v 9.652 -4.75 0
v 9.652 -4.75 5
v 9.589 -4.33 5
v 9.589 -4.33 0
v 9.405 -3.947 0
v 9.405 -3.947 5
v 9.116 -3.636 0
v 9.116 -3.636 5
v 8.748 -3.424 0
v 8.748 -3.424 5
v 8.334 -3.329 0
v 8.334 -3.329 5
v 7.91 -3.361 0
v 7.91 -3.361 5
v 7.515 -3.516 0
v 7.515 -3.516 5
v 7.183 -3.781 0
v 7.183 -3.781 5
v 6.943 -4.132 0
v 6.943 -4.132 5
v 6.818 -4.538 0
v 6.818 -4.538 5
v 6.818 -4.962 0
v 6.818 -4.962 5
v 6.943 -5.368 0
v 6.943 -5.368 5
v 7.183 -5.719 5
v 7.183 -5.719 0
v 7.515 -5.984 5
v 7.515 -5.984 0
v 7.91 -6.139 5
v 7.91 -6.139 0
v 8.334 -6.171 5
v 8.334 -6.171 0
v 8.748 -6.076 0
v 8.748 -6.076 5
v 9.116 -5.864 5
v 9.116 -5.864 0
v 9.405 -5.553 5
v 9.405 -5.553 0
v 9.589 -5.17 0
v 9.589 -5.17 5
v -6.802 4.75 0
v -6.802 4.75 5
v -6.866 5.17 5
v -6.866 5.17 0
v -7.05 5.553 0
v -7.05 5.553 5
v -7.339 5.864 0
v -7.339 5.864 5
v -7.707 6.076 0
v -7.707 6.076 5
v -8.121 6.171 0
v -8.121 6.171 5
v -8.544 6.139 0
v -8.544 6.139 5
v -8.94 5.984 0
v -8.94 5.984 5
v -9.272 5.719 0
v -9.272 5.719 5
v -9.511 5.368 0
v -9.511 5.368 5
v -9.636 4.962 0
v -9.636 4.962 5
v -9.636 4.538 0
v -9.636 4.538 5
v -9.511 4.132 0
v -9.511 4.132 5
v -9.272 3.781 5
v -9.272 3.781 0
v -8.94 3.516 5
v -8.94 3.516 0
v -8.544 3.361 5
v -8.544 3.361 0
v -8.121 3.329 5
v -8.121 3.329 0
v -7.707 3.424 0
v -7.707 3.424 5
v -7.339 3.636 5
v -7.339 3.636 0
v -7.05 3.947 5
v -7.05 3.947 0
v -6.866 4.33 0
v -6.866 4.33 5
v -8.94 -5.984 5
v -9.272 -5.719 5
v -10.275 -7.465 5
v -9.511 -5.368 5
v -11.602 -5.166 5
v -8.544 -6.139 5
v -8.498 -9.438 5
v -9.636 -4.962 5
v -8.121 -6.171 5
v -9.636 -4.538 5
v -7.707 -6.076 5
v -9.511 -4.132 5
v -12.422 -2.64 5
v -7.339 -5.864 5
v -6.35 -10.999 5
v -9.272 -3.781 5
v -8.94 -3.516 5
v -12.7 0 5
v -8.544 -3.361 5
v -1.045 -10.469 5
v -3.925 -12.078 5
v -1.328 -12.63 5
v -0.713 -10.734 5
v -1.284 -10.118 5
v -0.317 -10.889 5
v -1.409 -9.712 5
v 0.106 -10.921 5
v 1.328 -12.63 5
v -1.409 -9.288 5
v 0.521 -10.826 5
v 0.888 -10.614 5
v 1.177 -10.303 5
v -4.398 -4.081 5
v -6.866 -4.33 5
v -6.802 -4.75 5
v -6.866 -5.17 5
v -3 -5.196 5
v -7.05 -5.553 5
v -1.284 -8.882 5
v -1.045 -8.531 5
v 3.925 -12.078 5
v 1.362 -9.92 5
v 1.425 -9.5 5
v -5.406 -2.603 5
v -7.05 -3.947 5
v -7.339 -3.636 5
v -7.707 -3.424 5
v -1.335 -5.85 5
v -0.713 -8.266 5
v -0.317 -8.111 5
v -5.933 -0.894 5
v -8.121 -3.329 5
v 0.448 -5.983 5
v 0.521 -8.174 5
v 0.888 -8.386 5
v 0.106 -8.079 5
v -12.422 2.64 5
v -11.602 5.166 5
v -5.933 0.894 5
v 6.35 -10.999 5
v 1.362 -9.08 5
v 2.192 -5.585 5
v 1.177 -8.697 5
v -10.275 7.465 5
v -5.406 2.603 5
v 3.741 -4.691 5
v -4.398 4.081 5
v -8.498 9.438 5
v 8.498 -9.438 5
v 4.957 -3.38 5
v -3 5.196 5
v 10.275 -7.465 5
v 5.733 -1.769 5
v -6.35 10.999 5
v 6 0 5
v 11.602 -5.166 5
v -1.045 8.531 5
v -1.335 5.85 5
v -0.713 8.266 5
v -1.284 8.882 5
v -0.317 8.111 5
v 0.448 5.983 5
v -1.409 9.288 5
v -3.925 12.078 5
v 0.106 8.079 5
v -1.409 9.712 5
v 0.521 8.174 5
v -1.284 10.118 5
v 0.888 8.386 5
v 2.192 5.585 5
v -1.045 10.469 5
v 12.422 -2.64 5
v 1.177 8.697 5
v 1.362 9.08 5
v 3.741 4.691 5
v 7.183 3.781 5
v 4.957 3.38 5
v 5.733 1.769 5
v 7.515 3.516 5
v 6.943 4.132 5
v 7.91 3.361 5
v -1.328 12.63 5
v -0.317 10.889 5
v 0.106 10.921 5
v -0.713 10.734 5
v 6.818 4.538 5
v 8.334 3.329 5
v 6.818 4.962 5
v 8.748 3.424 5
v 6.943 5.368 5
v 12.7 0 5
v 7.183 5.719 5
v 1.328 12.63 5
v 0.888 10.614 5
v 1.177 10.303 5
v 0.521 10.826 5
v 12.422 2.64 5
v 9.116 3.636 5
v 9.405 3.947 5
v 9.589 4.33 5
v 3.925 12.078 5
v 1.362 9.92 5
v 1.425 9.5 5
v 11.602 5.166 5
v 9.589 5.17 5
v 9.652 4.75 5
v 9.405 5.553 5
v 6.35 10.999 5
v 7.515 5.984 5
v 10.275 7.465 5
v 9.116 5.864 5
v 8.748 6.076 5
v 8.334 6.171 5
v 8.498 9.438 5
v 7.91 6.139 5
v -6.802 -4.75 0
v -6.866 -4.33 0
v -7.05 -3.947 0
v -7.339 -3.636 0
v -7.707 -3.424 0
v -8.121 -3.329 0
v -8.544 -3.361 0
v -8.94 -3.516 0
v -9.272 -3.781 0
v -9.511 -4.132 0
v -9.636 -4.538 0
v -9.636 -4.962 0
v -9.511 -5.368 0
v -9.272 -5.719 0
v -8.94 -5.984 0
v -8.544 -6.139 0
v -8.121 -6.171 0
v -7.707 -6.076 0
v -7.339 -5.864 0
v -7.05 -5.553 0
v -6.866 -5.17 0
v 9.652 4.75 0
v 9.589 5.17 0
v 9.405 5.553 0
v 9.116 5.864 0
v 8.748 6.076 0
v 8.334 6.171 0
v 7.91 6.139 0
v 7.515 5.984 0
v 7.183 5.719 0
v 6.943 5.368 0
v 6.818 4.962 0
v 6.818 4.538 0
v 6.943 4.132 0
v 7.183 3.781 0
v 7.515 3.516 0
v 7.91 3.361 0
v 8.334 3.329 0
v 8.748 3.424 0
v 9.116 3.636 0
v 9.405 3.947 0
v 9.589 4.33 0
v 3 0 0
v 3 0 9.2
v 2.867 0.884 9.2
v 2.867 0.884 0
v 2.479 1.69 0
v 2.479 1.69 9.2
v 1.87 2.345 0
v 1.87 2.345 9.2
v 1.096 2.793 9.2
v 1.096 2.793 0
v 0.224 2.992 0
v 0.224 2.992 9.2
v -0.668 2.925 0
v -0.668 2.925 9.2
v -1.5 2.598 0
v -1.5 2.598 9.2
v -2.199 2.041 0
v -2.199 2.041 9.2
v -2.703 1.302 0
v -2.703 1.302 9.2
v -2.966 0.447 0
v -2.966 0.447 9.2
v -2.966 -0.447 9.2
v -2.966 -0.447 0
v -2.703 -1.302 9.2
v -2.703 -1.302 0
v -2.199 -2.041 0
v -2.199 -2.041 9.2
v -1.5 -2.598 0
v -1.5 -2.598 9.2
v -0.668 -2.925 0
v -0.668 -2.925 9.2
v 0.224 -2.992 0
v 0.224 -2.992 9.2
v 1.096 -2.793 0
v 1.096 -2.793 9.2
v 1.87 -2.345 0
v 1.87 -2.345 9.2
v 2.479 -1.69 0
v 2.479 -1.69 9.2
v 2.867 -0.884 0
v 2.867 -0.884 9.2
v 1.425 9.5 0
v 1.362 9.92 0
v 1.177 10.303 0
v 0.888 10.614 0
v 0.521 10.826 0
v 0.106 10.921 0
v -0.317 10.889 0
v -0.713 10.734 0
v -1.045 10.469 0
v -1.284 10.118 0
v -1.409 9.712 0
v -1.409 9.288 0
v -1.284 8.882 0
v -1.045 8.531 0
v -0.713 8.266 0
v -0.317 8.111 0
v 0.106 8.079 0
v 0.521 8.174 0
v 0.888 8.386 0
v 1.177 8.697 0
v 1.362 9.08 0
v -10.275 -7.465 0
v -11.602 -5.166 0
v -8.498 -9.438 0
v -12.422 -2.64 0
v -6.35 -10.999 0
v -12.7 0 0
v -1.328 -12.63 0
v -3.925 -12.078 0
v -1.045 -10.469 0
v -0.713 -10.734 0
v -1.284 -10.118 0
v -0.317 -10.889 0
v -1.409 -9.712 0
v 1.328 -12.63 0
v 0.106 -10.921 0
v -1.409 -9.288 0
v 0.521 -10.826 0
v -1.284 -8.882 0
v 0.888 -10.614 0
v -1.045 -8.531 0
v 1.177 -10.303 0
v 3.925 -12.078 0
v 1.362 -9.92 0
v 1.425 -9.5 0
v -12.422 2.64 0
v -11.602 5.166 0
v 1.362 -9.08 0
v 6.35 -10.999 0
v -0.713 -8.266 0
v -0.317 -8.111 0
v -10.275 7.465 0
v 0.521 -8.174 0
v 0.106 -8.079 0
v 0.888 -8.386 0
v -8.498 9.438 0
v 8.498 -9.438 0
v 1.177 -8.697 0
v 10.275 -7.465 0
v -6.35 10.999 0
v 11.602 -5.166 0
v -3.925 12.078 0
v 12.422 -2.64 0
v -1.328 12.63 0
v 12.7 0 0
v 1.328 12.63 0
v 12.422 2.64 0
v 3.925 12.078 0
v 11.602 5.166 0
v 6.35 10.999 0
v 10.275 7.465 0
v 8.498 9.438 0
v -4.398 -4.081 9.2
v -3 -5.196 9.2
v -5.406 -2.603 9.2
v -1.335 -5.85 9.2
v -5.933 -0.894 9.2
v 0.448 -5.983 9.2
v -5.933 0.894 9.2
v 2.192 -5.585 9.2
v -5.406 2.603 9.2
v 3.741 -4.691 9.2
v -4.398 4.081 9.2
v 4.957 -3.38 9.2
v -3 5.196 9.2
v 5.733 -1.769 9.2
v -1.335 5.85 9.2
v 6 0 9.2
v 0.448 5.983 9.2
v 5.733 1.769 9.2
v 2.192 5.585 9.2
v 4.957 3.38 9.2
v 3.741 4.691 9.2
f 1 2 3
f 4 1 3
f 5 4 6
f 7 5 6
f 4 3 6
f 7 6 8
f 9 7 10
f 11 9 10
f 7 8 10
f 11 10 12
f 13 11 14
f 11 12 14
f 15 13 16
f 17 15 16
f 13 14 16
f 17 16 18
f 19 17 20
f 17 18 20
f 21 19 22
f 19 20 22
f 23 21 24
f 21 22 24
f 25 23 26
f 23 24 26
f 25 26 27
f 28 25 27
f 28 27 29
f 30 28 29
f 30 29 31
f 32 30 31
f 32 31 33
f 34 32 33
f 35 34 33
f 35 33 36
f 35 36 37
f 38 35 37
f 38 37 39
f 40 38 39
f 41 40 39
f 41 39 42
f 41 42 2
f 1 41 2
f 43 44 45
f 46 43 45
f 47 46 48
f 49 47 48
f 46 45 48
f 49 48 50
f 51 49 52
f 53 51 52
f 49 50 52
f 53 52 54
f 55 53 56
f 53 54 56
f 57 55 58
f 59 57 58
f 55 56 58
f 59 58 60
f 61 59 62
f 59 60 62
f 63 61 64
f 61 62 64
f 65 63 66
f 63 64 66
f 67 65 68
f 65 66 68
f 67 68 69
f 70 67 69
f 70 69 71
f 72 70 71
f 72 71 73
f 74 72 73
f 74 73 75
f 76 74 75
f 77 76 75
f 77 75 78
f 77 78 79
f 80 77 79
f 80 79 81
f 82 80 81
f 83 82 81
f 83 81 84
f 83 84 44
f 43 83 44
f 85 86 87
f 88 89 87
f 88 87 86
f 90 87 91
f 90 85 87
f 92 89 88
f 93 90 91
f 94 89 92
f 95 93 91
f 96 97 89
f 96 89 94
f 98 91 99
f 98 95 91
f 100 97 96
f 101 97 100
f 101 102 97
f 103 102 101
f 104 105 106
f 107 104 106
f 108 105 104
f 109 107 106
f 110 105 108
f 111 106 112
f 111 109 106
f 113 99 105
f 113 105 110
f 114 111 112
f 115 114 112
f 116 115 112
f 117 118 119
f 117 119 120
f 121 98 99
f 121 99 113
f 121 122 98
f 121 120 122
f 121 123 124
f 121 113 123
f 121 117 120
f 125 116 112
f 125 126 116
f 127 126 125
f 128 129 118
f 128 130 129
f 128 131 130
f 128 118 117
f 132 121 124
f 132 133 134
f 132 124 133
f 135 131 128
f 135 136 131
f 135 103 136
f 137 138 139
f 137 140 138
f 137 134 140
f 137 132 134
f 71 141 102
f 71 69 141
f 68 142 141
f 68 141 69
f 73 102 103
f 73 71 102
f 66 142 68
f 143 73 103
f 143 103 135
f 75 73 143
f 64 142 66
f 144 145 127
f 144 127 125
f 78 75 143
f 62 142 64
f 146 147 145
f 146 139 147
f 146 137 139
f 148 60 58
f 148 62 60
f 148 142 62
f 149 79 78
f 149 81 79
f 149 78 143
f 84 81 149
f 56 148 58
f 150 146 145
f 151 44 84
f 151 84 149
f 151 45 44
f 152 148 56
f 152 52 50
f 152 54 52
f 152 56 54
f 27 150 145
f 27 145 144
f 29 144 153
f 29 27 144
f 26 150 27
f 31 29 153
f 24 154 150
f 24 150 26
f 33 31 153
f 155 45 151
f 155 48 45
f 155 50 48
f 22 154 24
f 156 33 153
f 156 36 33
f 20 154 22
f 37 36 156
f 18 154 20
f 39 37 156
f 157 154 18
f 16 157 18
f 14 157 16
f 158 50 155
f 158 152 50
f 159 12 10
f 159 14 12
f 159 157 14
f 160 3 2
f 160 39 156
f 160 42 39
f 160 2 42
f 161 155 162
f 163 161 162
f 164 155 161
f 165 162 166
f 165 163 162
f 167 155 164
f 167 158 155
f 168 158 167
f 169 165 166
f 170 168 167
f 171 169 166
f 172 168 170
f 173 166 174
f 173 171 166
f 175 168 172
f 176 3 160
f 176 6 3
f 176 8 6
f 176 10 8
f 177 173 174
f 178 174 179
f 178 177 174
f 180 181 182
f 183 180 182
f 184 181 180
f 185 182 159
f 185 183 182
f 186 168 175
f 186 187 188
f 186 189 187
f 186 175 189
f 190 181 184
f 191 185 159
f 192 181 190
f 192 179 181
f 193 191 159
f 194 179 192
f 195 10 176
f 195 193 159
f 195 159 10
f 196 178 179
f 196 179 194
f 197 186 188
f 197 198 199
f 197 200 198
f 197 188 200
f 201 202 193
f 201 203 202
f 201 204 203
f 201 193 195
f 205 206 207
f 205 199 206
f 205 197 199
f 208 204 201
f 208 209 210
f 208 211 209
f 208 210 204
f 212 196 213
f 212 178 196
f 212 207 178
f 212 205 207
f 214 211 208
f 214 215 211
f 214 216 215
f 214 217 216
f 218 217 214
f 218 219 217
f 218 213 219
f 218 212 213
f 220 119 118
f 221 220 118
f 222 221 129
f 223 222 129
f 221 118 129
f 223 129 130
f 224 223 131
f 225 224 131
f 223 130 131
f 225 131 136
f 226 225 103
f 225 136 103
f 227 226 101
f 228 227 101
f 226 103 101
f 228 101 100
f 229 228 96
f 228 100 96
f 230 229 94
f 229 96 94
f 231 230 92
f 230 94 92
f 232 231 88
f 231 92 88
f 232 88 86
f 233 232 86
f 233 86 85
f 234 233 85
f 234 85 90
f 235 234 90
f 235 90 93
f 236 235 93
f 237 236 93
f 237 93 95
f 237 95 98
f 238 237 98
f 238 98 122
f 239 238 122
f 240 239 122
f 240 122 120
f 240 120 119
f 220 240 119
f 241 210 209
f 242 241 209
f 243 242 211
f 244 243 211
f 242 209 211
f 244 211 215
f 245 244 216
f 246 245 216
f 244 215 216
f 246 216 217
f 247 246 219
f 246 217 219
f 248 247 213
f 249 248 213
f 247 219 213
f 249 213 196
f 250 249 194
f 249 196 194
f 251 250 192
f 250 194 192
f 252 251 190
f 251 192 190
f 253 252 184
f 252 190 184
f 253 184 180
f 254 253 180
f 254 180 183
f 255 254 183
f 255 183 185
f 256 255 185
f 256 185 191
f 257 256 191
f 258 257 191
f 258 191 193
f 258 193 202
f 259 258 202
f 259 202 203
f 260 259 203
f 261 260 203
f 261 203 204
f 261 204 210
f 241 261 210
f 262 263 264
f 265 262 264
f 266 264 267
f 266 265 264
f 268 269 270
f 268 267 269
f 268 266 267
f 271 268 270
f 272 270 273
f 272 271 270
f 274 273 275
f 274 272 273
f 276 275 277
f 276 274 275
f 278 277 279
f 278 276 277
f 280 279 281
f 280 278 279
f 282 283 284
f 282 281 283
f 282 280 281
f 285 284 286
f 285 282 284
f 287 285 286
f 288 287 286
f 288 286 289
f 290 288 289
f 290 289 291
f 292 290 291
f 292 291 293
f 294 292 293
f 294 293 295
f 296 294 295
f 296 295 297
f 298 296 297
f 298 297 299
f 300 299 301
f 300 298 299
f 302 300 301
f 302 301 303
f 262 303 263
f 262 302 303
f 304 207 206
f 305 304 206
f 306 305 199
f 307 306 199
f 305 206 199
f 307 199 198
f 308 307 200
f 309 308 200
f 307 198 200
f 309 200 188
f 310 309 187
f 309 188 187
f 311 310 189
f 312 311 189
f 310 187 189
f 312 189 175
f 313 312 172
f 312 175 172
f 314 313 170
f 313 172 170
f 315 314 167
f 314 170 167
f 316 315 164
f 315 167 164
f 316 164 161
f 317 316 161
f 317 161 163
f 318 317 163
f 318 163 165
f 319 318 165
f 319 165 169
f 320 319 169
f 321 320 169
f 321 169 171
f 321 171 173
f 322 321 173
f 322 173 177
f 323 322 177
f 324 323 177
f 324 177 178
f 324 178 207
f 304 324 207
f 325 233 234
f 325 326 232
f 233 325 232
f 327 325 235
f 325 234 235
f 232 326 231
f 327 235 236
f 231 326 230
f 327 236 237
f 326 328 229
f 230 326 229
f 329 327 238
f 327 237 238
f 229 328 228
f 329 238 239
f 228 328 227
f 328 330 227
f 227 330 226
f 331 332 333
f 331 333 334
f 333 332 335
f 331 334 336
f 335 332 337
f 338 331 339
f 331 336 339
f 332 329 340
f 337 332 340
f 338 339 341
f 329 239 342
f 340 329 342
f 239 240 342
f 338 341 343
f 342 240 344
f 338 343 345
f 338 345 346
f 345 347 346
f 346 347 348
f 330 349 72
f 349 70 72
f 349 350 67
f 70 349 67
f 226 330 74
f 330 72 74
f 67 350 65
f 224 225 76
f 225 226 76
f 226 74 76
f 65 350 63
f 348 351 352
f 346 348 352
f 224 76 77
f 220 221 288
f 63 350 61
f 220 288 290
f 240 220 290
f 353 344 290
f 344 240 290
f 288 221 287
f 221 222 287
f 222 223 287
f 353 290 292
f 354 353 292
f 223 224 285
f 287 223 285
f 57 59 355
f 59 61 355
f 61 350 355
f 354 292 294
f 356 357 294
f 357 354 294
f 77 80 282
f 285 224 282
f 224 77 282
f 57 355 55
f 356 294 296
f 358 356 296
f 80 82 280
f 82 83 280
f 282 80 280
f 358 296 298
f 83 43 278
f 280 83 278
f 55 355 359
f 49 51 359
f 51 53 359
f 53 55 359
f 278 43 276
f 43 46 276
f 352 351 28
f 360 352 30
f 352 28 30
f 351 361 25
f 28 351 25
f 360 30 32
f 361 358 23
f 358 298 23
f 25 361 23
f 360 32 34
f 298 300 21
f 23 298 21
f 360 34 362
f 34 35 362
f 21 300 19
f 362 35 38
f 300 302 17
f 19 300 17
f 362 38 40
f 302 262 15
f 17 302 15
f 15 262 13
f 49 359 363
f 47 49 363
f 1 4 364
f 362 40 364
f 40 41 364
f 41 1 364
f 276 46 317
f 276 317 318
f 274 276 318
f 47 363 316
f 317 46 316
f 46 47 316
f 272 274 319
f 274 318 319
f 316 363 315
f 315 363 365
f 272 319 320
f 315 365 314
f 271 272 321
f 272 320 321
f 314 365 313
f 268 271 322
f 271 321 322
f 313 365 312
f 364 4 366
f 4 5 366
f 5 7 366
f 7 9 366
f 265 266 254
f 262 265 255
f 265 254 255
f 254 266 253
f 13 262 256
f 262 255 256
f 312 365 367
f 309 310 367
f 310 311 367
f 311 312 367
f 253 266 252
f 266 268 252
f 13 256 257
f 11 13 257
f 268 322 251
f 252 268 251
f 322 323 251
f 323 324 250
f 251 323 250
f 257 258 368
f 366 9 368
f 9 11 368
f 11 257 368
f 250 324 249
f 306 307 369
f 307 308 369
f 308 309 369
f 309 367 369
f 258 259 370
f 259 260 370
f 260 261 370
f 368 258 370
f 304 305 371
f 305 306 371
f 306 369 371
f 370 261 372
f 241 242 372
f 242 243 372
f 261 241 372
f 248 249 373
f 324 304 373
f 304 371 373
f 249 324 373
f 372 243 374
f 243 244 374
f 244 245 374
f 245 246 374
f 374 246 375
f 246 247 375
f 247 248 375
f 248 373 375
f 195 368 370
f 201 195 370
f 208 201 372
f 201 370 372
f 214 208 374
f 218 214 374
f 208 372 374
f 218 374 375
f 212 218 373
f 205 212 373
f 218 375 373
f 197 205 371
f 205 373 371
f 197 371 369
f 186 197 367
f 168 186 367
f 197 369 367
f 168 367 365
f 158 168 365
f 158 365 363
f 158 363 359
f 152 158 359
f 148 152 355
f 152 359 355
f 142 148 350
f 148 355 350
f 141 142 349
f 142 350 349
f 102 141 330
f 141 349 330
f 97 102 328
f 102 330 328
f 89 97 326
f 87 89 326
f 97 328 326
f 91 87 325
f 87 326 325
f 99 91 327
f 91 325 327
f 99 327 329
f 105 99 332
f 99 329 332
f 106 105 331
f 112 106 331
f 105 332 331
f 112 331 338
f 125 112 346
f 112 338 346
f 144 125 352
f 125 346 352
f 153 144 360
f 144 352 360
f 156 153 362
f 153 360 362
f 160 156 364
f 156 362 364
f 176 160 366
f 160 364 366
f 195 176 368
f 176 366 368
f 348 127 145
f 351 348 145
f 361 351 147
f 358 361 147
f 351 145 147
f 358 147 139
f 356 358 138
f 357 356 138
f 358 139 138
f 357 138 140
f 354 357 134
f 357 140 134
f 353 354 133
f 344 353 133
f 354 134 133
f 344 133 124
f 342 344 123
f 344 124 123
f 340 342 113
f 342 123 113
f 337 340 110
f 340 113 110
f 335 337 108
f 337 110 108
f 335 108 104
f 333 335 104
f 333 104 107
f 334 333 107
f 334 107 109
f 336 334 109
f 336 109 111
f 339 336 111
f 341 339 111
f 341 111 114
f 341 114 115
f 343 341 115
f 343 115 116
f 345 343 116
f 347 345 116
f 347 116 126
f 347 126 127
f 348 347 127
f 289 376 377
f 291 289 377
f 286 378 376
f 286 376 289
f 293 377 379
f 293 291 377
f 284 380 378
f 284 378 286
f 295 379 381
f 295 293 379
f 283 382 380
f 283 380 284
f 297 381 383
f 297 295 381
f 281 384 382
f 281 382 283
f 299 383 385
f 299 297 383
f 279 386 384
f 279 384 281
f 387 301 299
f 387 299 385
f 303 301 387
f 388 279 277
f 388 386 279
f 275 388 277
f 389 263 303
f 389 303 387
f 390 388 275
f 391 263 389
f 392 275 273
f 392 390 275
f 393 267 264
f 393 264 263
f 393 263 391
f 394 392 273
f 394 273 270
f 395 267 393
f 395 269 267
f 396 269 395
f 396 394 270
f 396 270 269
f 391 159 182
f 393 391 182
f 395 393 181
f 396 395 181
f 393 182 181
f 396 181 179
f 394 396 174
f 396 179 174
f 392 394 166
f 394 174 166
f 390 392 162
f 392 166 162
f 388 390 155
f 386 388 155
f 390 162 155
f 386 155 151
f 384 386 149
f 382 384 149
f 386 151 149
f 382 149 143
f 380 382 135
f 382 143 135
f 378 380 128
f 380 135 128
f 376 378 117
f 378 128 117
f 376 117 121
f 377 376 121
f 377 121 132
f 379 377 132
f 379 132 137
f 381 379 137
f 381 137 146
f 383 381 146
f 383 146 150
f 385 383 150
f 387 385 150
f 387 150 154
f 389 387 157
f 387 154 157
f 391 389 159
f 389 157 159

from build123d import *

# Parameters (mm, degrees)
SKETCH1_R               = 12.7
BOSS_EXTRUDE1_DEPTH     = 5
SKETCH2_R               = 6
BOSS_EXTRUDE2_DEPTH     = 4.2
CUT_EXTRUDE1_REACH      = 20.643
SKETCH3_R               = 1.425
CUT_EXTRUDE2_DEPTH      = 21.179692763
CUT_EXTRUDE2_DEPTH_BACK = 21.179692763
SKETCH4_R               = 3


with BuildPart() as part:
    # Sketch1 → Boss-Extrude1 (new body)
    with BuildSketch(Plane.XY):
        Circle(SKETCH1_R)
    extrude(amount=BOSS_EXTRUDE1_DEPTH)

    # Sketch2 → Boss-Extrude2 (add)
    with BuildSketch(Plane.XY.offset(5)):
        Circle(SKETCH2_R)
    extrude(amount=BOSS_EXTRUDE2_DEPTH)

    # Sketch3 → Cut-Extrude1 (cut, up to next)
    with BuildSketch(Plane.XY.offset(5), mode=Mode.PRIVATE) as cut_extrude1_sk1:
        with Locations((0, 9.5)):
            Circle(SKETCH3_R)
    cut_extrude1_tool1 = extrude(cut_extrude1_sk1.sketch, amount=-CUT_EXTRUDE1_REACH, mode=Mode.PRIVATE) & part.part
    # Sketch3 → Cut-Extrude1 (cut, up to next)
    with BuildSketch(Plane.XY.offset(5), mode=Mode.PRIVATE) as cut_extrude1_sk2:
        with Locations((-8.227241336, 4.75)):
            Circle(SKETCH3_R)
    cut_extrude1_tool2 = extrude(cut_extrude1_sk2.sketch, amount=-CUT_EXTRUDE1_REACH, mode=Mode.PRIVATE) & part.part
    # Sketch3 → Cut-Extrude1 (cut, up to next)
    with BuildSketch(Plane.XY.offset(5), mode=Mode.PRIVATE) as cut_extrude1_sk3:
        with Locations((-8.227241336, -4.75)):
            Circle(SKETCH3_R)
    cut_extrude1_tool3 = extrude(cut_extrude1_sk3.sketch, amount=-CUT_EXTRUDE1_REACH, mode=Mode.PRIVATE) & part.part
    # Sketch3 → Cut-Extrude1 (cut, up to next)
    with BuildSketch(Plane.XY.offset(5), mode=Mode.PRIVATE) as cut_extrude1_sk4:
        with Locations((0, -9.5)):
            Circle(SKETCH3_R)
    cut_extrude1_tool4 = extrude(cut_extrude1_sk4.sketch, amount=-CUT_EXTRUDE1_REACH, mode=Mode.PRIVATE) & part.part
    # Sketch3 → Cut-Extrude1 (cut, up to next)
    with BuildSketch(Plane.XY.offset(5), mode=Mode.PRIVATE) as cut_extrude1_sk5:
        with Locations((8.227241336, -4.75)):
            Circle(SKETCH3_R)
    cut_extrude1_tool5 = extrude(cut_extrude1_sk5.sketch, amount=-CUT_EXTRUDE1_REACH, mode=Mode.PRIVATE) & part.part
    # Sketch3 → Cut-Extrude1 (cut, up to next)
    with BuildSketch(Plane.XY.offset(5), mode=Mode.PRIVATE) as cut_extrude1_sk6:
        with Locations((8.227241336, 4.75)):
            Circle(SKETCH3_R)
    cut_extrude1_tool6 = extrude(cut_extrude1_sk6.sketch, amount=-CUT_EXTRUDE1_REACH, mode=Mode.PRIVATE) & part.part
    add(cut_extrude1_tool1.solids().sort_by_distance((0, 9.5, 5))[0], mode=Mode.SUBTRACT)
    add(cut_extrude1_tool2.solids().sort_by_distance((-8.227241, 4.75, 5))[0], mode=Mode.SUBTRACT)
    add(cut_extrude1_tool3.solids().sort_by_distance((-8.227241, -4.75, 5))[0], mode=Mode.SUBTRACT)
    add(cut_extrude1_tool4.solids().sort_by_distance((0, -9.5, 5))[0], mode=Mode.SUBTRACT)
    add(cut_extrude1_tool5.solids().sort_by_distance((8.227241, -4.75, 5))[0], mode=Mode.SUBTRACT)
    add(cut_extrude1_tool6.solids().sort_by_distance((8.227241, 4.75, 5))[0], mode=Mode.SUBTRACT)

    # Sketch4 → Cut-Extrude2 (cut, two sides: drawn at the far end of the back side and taken through both)
    with BuildSketch(Plane.XY.offset(9.2).offset(-CUT_EXTRUDE2_DEPTH_BACK)):
        Circle(SKETCH4_R)
    extrude(amount=CUT_EXTRUDE2_DEPTH + CUT_EXTRUDE2_DEPTH_BACK, mode=Mode.SUBTRACT)


solid = part.part
